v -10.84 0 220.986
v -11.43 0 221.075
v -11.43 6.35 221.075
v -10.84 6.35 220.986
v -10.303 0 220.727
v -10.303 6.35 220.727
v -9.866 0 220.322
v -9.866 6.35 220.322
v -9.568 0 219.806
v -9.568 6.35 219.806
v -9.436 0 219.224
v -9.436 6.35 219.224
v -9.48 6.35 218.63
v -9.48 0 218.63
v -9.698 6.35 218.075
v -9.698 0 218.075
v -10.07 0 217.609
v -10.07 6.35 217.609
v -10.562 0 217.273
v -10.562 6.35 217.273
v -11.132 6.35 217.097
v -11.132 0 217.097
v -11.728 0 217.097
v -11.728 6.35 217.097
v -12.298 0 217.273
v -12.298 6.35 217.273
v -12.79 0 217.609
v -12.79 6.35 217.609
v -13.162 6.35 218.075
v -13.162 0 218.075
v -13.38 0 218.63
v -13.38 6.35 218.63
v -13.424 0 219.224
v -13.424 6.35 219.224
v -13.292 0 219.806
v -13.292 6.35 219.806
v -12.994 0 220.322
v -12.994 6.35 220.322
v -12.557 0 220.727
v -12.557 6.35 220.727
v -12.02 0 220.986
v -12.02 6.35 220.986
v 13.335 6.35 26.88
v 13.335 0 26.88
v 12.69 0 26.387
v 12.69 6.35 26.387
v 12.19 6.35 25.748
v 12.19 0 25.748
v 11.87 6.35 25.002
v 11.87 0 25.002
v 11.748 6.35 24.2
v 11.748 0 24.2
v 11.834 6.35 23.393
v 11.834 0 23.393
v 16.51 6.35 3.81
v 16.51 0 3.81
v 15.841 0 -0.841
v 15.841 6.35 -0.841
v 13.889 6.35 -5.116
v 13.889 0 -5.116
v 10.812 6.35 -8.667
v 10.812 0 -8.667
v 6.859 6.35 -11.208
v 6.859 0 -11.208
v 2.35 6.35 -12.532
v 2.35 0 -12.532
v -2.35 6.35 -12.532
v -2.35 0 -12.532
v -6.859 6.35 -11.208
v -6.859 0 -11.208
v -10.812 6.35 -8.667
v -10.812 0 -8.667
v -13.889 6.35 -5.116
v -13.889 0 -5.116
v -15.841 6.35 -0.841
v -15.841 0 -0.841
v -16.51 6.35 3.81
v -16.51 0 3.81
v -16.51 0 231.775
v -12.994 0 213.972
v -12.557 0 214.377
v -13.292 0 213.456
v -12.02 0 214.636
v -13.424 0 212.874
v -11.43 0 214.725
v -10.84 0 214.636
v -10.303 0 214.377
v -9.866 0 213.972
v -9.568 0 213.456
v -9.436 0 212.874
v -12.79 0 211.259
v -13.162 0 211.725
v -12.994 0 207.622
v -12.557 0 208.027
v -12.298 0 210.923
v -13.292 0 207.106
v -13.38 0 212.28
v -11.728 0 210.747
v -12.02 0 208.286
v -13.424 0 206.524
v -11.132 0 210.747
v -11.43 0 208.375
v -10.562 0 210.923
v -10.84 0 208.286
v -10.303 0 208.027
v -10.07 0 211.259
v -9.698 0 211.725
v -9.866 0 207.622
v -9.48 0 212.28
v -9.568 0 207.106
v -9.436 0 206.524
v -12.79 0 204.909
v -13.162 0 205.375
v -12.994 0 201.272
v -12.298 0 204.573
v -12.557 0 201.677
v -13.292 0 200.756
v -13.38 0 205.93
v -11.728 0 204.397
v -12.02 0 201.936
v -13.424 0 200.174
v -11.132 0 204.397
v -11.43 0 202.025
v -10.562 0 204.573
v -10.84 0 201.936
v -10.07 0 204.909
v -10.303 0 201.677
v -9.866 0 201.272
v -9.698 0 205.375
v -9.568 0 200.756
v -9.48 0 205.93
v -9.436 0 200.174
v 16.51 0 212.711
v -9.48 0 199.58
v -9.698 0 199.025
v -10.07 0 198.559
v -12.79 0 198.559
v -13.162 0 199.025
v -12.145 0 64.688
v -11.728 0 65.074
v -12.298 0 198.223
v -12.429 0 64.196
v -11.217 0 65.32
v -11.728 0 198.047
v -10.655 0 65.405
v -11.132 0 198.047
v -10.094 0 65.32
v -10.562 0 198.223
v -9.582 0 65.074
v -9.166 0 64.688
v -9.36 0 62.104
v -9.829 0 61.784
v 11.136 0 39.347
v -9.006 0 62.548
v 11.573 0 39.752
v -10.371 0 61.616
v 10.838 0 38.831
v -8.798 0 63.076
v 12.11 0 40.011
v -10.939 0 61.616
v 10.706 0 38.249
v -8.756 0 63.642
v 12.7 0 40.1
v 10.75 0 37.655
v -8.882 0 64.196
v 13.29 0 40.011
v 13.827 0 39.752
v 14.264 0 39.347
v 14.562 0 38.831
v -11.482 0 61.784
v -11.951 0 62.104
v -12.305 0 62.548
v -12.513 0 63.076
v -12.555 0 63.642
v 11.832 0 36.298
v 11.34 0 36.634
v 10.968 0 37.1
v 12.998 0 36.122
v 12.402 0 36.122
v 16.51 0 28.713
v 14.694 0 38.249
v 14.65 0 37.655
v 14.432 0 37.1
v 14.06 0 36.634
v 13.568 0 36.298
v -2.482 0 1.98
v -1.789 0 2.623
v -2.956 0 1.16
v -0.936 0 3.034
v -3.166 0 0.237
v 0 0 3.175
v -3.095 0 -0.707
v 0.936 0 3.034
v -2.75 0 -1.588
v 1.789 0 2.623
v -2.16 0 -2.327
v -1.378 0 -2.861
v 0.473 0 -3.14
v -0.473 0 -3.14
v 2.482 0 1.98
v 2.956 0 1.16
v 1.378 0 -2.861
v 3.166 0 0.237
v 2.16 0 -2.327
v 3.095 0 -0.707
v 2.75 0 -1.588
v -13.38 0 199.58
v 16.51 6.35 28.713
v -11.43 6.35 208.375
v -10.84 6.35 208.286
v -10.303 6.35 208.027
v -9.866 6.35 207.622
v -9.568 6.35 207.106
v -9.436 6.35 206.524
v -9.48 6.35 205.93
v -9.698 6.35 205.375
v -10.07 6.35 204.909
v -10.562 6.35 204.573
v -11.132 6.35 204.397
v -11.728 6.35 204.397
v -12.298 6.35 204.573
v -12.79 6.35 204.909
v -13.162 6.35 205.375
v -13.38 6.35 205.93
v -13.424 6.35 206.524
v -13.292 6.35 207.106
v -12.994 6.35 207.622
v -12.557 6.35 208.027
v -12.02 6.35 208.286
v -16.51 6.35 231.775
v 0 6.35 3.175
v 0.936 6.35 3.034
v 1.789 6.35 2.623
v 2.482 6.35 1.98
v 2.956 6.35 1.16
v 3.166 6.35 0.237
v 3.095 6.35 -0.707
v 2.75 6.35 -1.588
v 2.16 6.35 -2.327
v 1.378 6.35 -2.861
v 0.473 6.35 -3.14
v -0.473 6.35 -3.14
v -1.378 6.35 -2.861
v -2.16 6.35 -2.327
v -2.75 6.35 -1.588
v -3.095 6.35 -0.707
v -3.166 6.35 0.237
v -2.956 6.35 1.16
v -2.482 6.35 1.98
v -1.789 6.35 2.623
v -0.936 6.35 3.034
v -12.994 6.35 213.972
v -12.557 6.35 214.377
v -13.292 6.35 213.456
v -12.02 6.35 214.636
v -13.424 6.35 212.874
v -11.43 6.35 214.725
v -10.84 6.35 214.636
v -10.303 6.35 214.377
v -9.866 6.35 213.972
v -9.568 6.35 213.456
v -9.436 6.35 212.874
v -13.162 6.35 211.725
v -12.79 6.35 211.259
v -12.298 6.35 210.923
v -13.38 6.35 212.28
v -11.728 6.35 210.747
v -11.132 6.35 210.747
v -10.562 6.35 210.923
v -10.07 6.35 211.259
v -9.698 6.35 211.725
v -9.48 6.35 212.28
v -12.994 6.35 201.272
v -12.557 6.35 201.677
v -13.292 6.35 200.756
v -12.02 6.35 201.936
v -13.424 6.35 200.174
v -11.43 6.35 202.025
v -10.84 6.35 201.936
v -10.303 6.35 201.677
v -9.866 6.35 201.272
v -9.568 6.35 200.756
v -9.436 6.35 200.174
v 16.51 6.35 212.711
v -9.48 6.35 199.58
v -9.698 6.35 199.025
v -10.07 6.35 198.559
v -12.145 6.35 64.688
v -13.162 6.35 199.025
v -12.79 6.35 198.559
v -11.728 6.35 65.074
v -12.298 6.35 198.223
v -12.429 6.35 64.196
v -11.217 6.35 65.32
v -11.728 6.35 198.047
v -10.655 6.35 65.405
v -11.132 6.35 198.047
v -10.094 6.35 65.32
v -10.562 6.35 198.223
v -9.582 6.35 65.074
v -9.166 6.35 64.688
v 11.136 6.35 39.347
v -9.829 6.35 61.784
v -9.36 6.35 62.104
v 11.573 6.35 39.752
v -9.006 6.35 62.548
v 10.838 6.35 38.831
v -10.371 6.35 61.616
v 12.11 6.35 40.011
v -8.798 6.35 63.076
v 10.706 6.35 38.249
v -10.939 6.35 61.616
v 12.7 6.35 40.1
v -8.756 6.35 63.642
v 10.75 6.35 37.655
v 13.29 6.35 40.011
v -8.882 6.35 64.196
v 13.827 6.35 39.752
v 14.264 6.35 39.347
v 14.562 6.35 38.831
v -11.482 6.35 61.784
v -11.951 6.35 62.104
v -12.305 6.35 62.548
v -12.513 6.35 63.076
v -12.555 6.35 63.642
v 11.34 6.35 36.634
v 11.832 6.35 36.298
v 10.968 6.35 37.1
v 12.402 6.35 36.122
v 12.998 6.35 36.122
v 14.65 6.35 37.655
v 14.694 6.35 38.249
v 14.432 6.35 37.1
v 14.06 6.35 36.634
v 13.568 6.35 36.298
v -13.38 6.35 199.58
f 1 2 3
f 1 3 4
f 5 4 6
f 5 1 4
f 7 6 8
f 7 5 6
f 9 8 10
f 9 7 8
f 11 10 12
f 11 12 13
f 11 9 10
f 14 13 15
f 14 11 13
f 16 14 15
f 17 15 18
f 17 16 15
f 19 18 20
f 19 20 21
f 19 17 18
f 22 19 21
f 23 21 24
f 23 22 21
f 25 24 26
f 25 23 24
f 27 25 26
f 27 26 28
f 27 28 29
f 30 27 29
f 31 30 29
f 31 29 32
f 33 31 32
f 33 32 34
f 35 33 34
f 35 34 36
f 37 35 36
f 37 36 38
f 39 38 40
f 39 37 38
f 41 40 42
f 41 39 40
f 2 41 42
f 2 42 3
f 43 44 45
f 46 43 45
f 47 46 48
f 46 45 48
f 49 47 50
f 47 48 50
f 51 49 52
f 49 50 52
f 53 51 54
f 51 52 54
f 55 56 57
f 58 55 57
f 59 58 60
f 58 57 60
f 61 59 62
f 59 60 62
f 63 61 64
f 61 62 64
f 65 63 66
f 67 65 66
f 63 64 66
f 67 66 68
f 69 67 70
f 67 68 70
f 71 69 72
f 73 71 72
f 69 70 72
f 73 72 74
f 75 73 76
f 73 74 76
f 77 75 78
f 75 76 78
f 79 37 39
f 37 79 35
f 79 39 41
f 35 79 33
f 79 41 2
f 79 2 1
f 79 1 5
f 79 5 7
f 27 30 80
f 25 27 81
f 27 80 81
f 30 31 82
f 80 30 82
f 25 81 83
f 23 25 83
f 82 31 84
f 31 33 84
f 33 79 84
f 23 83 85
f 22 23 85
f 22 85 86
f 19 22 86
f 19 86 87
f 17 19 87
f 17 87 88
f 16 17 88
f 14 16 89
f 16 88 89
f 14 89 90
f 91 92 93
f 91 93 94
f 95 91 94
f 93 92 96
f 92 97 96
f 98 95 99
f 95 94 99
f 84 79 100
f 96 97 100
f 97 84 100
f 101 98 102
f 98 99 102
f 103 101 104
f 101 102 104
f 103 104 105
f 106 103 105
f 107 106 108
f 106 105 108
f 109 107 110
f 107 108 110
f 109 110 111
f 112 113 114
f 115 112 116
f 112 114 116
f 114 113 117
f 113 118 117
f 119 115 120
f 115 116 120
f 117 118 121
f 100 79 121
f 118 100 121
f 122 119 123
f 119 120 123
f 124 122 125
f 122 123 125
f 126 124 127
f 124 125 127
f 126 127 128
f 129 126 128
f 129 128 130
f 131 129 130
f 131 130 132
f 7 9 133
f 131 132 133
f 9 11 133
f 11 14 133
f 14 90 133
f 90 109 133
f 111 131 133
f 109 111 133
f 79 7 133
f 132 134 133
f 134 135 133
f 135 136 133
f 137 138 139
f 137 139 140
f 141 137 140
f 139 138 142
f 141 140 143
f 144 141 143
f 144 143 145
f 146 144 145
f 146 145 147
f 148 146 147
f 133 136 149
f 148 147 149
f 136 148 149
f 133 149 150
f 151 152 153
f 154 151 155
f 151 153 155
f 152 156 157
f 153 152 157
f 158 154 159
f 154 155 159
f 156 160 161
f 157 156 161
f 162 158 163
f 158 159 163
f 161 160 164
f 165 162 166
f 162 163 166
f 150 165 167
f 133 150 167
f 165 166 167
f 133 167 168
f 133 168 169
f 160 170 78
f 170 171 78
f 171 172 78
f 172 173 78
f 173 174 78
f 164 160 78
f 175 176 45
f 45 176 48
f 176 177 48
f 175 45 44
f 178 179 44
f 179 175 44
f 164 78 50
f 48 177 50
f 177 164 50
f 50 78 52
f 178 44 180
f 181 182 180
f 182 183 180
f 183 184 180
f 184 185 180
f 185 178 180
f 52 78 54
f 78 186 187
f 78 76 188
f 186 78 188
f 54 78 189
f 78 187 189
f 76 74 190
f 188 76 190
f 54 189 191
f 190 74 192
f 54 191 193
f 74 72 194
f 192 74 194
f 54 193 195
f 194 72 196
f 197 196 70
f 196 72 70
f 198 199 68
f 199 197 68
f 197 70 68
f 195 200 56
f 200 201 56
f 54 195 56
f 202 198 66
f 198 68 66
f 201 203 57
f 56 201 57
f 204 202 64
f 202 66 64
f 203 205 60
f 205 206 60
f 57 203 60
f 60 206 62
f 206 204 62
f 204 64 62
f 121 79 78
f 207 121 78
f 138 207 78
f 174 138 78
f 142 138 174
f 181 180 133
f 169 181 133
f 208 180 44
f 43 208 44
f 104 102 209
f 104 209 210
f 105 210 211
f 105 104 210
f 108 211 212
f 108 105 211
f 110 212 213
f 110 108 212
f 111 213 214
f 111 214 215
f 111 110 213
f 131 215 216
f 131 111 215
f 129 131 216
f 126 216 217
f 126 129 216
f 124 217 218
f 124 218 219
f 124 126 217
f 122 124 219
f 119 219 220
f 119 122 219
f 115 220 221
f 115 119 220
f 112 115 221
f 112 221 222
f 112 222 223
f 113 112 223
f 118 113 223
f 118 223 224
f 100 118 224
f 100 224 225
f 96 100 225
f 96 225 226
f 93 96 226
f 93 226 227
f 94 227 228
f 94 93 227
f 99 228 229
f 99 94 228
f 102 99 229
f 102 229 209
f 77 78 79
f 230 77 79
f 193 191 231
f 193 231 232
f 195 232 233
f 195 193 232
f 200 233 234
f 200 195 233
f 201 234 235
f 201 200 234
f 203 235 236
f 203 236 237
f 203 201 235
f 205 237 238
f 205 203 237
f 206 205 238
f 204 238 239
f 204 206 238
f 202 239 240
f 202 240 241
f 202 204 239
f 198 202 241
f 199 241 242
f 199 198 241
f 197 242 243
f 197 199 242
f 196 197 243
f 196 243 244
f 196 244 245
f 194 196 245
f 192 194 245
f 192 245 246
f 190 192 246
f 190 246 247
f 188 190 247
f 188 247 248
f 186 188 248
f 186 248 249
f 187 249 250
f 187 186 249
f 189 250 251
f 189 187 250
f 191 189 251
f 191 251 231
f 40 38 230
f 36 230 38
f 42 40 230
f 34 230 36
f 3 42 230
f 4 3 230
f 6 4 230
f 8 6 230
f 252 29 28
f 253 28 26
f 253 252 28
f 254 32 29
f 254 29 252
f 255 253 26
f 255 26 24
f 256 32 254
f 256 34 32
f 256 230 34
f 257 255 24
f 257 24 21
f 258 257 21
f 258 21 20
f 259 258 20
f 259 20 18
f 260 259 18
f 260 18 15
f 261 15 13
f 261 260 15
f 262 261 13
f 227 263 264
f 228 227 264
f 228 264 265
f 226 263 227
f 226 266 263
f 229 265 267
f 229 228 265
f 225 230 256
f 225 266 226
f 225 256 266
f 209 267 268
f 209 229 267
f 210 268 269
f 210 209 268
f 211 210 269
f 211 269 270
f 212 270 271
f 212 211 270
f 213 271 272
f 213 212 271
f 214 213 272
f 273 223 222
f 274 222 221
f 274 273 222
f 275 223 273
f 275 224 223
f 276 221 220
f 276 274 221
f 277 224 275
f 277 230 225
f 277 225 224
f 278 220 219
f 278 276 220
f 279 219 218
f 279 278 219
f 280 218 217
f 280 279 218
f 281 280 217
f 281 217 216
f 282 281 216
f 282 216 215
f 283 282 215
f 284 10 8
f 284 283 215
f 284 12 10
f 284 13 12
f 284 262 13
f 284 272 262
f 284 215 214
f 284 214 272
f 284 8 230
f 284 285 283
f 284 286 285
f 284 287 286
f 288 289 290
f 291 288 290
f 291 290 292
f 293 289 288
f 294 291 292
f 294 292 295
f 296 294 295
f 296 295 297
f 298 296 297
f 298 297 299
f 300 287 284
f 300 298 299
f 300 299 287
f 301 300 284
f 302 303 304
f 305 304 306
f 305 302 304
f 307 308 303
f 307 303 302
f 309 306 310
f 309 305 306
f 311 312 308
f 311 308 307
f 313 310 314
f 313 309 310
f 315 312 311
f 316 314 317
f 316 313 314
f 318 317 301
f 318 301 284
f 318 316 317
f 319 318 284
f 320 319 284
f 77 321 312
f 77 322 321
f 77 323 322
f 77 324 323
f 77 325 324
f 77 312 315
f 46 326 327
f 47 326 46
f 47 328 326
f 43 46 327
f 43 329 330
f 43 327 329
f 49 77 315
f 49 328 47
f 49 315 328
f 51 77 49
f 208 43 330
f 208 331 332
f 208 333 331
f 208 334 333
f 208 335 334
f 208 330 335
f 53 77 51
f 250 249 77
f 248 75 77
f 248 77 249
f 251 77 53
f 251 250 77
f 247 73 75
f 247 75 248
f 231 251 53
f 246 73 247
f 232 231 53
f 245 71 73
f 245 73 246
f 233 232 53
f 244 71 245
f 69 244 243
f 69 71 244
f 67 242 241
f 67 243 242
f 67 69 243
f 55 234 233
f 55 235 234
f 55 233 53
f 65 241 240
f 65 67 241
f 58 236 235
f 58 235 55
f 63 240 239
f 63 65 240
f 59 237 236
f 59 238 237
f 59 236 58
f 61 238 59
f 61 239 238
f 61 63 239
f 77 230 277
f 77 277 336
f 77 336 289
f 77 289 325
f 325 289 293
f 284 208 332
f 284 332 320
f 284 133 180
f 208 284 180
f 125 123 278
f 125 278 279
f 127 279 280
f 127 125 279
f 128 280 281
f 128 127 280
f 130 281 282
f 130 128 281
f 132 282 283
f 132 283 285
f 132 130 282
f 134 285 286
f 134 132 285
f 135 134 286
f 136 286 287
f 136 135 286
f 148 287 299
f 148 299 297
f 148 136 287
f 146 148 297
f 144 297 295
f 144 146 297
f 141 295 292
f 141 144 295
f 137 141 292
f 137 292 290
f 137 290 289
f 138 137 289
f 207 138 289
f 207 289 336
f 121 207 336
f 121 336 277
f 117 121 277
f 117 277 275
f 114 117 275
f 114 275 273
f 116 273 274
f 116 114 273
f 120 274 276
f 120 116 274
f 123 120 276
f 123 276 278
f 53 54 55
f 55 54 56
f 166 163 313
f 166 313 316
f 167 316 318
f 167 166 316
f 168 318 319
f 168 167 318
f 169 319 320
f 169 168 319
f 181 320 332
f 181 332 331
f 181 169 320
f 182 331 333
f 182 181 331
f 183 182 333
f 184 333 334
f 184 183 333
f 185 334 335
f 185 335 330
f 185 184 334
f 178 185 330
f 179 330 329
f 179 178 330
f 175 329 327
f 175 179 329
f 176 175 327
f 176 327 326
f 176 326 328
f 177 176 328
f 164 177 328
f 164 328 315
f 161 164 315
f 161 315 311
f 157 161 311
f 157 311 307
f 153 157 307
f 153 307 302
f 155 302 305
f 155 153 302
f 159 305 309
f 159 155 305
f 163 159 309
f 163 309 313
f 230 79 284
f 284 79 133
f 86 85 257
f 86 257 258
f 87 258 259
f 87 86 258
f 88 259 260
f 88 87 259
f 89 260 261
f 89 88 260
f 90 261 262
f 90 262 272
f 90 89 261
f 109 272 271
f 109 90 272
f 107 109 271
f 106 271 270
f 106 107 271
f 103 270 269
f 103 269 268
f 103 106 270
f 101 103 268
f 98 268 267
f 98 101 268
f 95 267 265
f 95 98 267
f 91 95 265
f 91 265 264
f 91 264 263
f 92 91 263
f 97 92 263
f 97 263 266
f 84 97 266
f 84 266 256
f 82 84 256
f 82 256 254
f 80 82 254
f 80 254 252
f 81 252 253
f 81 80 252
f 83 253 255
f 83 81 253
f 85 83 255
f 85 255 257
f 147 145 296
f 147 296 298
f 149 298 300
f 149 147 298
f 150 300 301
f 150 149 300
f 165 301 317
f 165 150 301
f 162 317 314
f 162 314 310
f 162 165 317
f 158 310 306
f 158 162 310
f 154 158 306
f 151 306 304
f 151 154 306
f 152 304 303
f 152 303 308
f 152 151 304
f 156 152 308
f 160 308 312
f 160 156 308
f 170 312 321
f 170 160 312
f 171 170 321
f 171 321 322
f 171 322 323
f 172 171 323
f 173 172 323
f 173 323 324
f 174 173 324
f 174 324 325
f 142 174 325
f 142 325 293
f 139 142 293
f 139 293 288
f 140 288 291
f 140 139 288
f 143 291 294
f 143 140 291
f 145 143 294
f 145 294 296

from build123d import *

# Parameters (mm, degrees)
SKETCH2_R           = 3.175
SKETCH2_R_2         = 2
SKETCH2_R_3         = 1.905
BOSS_EXTRUDE1_DEPTH = 6.35


with BuildPart() as part:
    # Sketch2 → Boss-Extrude1 (new body)
    with BuildSketch(Plane(origin=(0, 0, 0), x_dir=(1, 0, 0), z_dir=(0, 1, 0))):
        with BuildLine():
            Line((-16.51, -3.81), (-16.51, -231.775))
            Line((-16.51, -231.775), (16.51, -212.710894111))
            Line((16.51, -212.710894111), (16.51, -28.712717762))
            Line((16.51, -28.712717762), (13.335, -26.879630657))
            ThreePointArc((13.335, -26.879630657), (12.006115832, -25.385120864), (11.834308438, -23.392641284))
            Line((11.834308438, -23.392641284), (16.51, -3.81))
            ThreePointArc((16.51, -3.81), (0, 12.7), (-16.51, -3.81))
        make_face()
        with Locations(Location((0, 0, 0), (0, 0, 270))):
            Circle(SKETCH2_R, mode=Mode.SUBTRACT)
        with Locations(Location((-11.43, -219.075, 0), (0, 0, 270))):
            Circle(SKETCH2_R_2, mode=Mode.SUBTRACT)
        with Locations(Location((-11.43, -212.725, 0), (0, 0, 270))):
            Circle(SKETCH2_R_2, mode=Mode.SUBTRACT)
        with Locations(Location((-11.43, -206.375, 0), (0, 0, 270))):
            Circle(SKETCH2_R_2, mode=Mode.SUBTRACT)
        with Locations(Location((-11.43, -200.025, 0), (0, 0, 270))):
            Circle(SKETCH2_R_2, mode=Mode.SUBTRACT)
        with Locations(Location((-10.6553, -63.5, 0), (0, 0, 270))):
            Circle(SKETCH2_R_3, mode=Mode.SUBTRACT)
        with Locations(Location((12.7, -38.1, 0), (0, 0, 270))):
            Circle(SKETCH2_R_2, mode=Mode.SUBTRACT)
    extrude(amount=BOSS_EXTRUDE1_DEPTH)


solid = part.part
